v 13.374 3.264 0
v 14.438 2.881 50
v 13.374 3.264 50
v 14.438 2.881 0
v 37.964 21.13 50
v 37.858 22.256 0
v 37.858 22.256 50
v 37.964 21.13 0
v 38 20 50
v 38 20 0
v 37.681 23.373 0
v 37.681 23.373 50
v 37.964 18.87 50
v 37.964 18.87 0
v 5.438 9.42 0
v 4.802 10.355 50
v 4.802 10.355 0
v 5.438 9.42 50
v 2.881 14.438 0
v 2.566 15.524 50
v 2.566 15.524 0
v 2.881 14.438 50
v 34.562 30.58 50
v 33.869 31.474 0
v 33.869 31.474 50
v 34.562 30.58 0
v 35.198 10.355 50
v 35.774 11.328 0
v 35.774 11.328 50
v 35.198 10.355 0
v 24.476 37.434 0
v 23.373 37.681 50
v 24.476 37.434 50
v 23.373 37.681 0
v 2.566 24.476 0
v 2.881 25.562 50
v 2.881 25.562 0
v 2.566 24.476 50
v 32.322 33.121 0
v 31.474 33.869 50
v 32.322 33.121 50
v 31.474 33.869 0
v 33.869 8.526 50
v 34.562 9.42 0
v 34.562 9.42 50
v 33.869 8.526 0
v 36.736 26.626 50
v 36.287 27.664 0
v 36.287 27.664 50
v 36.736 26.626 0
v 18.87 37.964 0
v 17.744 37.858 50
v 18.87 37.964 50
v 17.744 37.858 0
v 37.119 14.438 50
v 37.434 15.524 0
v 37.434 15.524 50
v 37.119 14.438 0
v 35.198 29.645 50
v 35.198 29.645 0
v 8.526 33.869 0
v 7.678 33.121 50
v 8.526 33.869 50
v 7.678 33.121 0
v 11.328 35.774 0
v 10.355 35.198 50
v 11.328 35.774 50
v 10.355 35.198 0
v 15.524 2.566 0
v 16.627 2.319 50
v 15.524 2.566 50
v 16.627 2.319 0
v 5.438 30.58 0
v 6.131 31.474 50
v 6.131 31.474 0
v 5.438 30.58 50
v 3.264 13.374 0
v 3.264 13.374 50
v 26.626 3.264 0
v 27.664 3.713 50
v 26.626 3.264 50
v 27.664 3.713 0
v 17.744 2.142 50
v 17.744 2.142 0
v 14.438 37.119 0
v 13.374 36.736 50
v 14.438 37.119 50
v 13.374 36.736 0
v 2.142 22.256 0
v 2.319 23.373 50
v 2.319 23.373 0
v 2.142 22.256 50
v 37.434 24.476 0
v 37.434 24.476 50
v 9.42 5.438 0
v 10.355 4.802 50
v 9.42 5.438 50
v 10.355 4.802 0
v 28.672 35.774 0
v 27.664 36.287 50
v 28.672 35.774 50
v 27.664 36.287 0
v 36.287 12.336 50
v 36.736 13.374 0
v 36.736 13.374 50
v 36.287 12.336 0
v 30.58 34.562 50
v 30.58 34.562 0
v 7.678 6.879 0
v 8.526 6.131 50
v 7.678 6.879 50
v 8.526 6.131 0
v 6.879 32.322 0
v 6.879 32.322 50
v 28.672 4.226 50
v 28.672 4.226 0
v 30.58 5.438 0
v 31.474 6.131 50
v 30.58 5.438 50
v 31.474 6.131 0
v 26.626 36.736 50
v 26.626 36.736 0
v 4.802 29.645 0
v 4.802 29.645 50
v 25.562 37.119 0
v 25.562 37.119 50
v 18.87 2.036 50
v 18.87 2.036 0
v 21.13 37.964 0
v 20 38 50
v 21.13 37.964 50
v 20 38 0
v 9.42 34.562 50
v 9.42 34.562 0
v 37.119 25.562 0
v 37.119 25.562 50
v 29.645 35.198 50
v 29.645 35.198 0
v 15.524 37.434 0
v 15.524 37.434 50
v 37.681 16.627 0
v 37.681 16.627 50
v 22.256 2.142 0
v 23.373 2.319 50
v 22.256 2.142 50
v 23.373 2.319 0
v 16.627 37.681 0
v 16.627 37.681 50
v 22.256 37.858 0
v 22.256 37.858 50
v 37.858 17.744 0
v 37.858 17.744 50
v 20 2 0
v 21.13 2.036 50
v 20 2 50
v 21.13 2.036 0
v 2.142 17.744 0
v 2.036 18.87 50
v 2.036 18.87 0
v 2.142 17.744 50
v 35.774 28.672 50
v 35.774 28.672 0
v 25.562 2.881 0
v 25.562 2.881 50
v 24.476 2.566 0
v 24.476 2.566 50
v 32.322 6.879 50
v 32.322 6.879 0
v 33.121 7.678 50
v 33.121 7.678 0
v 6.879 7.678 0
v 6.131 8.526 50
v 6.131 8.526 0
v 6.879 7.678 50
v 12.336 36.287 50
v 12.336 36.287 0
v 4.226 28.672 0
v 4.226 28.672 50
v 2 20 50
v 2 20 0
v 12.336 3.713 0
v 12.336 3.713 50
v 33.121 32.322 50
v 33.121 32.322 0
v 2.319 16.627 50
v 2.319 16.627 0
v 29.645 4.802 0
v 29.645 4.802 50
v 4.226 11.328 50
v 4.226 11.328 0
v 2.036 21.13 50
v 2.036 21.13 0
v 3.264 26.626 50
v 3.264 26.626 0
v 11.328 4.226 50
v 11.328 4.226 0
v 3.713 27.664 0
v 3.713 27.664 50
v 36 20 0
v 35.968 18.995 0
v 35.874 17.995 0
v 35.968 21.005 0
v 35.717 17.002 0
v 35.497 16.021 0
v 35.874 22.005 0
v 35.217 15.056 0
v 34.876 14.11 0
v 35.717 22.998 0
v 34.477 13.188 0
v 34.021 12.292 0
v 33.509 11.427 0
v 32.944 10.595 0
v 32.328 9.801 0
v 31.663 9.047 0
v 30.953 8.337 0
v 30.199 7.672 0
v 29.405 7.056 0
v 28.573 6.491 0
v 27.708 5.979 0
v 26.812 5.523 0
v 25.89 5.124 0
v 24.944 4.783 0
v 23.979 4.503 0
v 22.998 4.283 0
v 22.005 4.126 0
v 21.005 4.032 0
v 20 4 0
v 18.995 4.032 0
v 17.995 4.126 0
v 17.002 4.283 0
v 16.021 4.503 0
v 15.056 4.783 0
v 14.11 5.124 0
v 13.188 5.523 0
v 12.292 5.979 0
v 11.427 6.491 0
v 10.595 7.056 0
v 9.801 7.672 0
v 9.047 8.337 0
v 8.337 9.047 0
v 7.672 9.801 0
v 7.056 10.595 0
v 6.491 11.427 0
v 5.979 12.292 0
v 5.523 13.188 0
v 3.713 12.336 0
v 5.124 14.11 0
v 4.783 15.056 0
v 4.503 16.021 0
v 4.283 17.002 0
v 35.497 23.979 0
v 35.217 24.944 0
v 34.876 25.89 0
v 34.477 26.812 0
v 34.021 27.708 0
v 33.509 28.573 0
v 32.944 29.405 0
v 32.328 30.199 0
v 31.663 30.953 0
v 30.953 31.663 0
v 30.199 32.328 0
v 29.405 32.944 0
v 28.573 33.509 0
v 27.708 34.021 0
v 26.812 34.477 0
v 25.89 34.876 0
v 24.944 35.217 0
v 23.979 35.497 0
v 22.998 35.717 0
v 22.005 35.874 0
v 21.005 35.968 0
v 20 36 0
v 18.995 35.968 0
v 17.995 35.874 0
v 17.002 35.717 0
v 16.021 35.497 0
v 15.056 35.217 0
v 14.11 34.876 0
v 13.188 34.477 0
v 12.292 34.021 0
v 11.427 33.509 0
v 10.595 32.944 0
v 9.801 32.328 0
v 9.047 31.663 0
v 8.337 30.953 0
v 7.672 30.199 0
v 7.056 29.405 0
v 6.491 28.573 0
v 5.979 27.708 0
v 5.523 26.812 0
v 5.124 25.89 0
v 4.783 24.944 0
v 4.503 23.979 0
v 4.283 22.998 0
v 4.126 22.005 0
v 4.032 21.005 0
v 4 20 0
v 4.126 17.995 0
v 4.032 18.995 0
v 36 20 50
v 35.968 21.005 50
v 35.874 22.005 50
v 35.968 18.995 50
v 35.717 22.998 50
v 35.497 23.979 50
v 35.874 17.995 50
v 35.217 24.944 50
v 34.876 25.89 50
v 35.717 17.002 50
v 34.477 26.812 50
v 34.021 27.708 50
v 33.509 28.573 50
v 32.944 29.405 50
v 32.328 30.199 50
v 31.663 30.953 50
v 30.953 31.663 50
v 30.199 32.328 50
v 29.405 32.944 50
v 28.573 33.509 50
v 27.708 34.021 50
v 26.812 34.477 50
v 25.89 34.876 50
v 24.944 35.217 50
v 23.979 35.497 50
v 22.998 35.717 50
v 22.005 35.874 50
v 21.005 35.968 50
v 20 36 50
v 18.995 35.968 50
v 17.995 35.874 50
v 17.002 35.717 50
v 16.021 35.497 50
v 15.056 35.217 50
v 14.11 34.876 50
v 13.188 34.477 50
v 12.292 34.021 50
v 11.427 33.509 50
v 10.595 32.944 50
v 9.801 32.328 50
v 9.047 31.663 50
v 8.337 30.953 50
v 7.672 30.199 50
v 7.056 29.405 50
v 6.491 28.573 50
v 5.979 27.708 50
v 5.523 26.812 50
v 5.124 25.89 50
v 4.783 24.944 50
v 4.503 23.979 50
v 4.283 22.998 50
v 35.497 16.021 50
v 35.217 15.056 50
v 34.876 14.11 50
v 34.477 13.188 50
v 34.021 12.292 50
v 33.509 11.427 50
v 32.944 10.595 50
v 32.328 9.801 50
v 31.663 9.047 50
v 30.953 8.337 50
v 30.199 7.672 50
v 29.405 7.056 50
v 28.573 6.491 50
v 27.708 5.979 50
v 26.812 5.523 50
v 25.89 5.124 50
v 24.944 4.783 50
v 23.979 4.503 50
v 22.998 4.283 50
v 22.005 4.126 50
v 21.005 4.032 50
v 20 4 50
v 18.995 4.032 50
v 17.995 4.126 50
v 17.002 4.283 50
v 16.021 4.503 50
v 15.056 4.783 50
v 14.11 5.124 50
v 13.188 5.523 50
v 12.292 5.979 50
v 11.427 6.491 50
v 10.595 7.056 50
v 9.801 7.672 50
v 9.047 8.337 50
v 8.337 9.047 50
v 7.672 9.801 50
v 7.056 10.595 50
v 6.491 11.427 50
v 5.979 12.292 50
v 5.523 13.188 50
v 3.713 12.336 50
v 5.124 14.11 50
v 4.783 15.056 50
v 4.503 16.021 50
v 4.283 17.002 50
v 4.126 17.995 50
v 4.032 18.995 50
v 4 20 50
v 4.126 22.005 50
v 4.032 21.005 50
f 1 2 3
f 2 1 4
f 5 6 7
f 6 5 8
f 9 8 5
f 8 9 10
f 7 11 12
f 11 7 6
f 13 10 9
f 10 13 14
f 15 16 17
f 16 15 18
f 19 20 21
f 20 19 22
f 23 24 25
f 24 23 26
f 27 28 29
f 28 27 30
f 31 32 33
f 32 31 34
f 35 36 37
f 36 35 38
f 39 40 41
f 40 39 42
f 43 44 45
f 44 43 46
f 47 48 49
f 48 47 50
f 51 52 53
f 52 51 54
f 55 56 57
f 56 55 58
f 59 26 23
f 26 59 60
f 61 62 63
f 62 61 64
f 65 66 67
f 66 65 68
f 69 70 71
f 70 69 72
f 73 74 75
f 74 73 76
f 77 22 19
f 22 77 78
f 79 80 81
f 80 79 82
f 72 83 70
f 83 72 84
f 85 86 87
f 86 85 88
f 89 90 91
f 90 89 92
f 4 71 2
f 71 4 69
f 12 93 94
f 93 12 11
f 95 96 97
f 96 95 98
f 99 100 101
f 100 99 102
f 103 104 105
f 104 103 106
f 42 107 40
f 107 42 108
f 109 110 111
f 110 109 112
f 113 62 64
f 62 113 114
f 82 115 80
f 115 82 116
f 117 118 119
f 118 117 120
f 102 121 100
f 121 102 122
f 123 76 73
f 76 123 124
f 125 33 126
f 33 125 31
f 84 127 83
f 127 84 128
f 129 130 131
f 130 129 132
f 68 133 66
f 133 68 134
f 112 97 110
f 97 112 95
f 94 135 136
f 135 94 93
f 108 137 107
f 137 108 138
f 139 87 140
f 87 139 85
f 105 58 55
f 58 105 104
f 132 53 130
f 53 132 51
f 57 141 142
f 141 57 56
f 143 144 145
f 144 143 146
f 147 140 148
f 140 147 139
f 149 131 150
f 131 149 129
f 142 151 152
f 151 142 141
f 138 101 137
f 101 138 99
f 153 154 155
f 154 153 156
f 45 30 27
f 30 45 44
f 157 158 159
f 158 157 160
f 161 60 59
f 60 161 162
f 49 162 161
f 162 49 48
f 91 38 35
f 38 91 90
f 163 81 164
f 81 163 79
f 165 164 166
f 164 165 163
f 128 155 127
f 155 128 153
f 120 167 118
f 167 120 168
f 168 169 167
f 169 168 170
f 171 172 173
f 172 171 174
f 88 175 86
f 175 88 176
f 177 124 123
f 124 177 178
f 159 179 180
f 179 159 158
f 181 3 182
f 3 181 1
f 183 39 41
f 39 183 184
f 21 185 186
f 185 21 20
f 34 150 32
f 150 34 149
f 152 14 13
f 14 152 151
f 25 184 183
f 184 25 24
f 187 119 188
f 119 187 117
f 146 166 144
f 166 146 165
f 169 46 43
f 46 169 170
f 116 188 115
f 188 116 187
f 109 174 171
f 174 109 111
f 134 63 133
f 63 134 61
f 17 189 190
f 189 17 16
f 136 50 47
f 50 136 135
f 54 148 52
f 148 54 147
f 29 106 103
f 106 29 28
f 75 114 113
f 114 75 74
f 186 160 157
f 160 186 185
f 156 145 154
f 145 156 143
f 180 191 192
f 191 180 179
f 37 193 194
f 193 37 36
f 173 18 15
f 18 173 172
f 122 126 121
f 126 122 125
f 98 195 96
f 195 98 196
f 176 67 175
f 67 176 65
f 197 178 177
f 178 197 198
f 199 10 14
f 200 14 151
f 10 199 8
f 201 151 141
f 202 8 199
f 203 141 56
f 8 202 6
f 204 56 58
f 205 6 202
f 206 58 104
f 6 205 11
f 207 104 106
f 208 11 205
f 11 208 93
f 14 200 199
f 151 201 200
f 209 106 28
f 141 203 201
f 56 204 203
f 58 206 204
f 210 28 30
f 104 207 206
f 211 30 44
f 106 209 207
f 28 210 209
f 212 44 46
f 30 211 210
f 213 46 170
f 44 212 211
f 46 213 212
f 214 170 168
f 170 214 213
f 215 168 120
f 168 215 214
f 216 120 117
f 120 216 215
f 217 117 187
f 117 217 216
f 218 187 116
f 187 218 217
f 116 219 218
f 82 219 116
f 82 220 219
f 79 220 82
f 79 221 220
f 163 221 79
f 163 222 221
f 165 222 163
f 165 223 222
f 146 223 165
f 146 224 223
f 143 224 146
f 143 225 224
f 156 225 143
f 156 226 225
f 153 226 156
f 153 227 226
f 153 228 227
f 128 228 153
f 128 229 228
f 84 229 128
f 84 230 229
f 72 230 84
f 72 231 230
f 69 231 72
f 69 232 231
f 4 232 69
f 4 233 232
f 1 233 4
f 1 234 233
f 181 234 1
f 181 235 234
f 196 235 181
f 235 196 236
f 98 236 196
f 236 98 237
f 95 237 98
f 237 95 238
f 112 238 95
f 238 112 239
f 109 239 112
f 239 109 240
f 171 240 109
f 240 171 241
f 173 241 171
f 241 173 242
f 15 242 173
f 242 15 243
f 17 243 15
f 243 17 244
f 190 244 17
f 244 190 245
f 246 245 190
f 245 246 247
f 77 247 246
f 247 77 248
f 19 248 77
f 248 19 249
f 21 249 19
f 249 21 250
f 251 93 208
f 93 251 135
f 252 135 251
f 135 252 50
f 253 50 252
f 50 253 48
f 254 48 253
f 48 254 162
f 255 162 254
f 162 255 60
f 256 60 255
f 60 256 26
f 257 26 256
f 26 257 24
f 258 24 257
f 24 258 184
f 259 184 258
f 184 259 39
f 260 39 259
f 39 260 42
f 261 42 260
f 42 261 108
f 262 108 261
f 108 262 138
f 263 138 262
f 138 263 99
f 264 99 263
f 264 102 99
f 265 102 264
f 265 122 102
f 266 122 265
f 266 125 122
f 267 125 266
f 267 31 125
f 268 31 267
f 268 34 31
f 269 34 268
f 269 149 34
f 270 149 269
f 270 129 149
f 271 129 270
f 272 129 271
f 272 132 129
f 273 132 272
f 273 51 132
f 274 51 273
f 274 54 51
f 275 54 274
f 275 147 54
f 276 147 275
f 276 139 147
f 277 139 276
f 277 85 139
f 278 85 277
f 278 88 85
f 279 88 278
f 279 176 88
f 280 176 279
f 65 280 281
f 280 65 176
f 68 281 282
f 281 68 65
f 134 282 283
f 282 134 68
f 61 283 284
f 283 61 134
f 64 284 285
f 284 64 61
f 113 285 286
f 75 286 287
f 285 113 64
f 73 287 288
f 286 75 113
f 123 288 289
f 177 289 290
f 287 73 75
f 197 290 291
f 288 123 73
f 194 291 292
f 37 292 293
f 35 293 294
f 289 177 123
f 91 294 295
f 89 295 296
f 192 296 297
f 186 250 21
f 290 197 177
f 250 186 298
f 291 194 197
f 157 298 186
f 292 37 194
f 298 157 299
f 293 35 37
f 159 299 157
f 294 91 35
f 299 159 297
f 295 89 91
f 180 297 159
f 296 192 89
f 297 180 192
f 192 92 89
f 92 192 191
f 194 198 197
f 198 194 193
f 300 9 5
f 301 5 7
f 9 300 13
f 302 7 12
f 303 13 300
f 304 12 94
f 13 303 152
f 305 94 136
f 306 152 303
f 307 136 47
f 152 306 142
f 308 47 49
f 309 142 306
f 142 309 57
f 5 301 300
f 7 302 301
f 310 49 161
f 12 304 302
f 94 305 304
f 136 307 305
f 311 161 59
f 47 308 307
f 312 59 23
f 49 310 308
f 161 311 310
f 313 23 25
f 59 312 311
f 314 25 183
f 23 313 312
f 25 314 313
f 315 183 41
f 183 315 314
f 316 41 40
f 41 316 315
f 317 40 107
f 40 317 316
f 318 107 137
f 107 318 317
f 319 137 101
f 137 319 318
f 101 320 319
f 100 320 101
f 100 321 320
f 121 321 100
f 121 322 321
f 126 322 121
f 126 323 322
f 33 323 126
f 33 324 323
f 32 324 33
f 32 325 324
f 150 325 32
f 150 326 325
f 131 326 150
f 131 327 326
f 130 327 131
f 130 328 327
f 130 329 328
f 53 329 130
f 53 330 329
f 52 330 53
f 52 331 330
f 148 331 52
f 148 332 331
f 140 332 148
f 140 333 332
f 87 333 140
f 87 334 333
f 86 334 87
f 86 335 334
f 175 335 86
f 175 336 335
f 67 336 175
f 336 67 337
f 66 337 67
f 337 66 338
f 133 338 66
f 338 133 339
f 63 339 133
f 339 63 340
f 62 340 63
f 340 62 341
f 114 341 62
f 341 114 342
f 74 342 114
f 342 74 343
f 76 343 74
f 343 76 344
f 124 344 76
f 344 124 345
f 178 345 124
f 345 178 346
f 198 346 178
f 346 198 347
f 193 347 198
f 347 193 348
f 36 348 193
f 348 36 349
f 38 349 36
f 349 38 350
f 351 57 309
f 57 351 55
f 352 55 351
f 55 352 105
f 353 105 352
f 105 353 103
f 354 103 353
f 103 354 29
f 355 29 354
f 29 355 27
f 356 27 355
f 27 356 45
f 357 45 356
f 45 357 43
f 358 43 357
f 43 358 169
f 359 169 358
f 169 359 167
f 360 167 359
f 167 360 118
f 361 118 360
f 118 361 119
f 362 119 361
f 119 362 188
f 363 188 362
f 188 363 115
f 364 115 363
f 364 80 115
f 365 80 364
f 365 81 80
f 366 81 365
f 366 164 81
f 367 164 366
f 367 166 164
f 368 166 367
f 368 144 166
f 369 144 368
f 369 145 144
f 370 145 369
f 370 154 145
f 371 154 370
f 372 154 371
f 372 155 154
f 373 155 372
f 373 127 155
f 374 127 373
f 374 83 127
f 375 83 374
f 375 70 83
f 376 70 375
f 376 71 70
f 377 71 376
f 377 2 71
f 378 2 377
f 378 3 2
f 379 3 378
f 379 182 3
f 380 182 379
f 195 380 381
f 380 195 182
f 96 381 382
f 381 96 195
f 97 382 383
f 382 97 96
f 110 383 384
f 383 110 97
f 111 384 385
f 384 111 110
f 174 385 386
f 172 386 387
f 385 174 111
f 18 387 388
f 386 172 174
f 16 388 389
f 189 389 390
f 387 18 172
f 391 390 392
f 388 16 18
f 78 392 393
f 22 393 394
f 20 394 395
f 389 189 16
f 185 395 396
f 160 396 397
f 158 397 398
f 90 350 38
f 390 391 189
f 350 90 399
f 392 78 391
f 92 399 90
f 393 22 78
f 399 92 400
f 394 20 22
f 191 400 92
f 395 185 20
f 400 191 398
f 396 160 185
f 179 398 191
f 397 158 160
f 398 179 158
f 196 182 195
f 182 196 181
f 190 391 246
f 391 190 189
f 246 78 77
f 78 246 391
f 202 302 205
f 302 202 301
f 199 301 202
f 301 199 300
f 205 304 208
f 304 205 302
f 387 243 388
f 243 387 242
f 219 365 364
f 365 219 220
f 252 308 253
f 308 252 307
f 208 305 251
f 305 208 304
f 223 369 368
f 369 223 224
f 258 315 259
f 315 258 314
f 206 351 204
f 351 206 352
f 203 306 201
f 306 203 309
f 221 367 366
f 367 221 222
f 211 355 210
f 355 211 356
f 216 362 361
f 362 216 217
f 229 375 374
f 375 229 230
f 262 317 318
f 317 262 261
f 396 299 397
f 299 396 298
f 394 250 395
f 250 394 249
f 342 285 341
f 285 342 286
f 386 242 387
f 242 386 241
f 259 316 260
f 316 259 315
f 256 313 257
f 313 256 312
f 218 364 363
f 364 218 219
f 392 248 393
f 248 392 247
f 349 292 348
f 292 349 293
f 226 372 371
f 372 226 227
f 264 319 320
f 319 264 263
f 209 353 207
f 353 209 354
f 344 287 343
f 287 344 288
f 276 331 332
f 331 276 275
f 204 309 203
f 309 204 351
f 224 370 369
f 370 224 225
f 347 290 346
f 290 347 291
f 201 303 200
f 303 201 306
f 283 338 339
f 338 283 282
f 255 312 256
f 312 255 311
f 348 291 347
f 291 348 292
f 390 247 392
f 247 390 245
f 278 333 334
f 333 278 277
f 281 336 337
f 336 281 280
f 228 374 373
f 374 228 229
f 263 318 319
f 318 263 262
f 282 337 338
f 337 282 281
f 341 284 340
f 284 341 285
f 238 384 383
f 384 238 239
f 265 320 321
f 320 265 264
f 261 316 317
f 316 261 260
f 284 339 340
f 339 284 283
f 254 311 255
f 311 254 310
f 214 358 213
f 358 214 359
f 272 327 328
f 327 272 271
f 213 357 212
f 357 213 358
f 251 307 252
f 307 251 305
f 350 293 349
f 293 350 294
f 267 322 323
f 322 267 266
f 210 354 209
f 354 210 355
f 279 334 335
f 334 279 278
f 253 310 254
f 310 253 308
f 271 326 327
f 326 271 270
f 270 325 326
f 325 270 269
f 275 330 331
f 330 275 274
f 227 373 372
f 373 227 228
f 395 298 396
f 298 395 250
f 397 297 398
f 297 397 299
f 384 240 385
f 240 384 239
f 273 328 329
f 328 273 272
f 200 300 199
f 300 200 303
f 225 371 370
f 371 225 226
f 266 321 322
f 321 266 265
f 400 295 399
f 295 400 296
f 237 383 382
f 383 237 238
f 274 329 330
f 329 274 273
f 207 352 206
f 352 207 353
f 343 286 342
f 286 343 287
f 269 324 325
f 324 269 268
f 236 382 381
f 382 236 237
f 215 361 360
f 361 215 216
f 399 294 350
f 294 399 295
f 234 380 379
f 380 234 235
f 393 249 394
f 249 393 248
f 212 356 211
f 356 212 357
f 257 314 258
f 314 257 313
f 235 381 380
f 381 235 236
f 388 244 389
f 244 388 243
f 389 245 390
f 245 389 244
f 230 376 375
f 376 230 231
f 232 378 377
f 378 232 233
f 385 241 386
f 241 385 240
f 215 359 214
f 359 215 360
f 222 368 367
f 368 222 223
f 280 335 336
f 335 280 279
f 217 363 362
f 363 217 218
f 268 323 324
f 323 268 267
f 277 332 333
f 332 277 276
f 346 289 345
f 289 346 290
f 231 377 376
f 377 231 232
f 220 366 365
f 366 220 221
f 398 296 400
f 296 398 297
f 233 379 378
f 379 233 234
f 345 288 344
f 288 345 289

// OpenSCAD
CylinderWidth=40;
Seedrows=1;
Seedcolumns=1;
Thickness=2;
CylinderHeight=50;
CellSpacing=2;
CellPad=20;


spokeCount=24;
spokerows=8;
spokeDia=15;
spokeY=2;
wallWidth=2;

Tube();

module Tube()
{
    union()
    {
        for(x = [1:Seedcolumns], Y =[1:Seedrows])
        {
               //translate([(40*x), (40*Y),-1]) color("Blue") cube($fn=100,[35,35,5],center=true)
            translate([(CylinderWidth*(x-1))+CellPad, (CylinderWidth*(Y-1))+CellPad,0])  
            difference()
            {
                color("Green")cylinder($fn=100,CylinderHeight,(CylinderWidth/2)-2,(CylinderWidth/2)-2,center=false);
                translate(0,0,10) cylinder($fn=100,CylinderHeight+2,((CylinderWidth/2)) - (wallWidth+CellSpacing),((CylinderWidth/2))-(wallWidth+CellSpacing),center=false);
            }
        }
    }
}
